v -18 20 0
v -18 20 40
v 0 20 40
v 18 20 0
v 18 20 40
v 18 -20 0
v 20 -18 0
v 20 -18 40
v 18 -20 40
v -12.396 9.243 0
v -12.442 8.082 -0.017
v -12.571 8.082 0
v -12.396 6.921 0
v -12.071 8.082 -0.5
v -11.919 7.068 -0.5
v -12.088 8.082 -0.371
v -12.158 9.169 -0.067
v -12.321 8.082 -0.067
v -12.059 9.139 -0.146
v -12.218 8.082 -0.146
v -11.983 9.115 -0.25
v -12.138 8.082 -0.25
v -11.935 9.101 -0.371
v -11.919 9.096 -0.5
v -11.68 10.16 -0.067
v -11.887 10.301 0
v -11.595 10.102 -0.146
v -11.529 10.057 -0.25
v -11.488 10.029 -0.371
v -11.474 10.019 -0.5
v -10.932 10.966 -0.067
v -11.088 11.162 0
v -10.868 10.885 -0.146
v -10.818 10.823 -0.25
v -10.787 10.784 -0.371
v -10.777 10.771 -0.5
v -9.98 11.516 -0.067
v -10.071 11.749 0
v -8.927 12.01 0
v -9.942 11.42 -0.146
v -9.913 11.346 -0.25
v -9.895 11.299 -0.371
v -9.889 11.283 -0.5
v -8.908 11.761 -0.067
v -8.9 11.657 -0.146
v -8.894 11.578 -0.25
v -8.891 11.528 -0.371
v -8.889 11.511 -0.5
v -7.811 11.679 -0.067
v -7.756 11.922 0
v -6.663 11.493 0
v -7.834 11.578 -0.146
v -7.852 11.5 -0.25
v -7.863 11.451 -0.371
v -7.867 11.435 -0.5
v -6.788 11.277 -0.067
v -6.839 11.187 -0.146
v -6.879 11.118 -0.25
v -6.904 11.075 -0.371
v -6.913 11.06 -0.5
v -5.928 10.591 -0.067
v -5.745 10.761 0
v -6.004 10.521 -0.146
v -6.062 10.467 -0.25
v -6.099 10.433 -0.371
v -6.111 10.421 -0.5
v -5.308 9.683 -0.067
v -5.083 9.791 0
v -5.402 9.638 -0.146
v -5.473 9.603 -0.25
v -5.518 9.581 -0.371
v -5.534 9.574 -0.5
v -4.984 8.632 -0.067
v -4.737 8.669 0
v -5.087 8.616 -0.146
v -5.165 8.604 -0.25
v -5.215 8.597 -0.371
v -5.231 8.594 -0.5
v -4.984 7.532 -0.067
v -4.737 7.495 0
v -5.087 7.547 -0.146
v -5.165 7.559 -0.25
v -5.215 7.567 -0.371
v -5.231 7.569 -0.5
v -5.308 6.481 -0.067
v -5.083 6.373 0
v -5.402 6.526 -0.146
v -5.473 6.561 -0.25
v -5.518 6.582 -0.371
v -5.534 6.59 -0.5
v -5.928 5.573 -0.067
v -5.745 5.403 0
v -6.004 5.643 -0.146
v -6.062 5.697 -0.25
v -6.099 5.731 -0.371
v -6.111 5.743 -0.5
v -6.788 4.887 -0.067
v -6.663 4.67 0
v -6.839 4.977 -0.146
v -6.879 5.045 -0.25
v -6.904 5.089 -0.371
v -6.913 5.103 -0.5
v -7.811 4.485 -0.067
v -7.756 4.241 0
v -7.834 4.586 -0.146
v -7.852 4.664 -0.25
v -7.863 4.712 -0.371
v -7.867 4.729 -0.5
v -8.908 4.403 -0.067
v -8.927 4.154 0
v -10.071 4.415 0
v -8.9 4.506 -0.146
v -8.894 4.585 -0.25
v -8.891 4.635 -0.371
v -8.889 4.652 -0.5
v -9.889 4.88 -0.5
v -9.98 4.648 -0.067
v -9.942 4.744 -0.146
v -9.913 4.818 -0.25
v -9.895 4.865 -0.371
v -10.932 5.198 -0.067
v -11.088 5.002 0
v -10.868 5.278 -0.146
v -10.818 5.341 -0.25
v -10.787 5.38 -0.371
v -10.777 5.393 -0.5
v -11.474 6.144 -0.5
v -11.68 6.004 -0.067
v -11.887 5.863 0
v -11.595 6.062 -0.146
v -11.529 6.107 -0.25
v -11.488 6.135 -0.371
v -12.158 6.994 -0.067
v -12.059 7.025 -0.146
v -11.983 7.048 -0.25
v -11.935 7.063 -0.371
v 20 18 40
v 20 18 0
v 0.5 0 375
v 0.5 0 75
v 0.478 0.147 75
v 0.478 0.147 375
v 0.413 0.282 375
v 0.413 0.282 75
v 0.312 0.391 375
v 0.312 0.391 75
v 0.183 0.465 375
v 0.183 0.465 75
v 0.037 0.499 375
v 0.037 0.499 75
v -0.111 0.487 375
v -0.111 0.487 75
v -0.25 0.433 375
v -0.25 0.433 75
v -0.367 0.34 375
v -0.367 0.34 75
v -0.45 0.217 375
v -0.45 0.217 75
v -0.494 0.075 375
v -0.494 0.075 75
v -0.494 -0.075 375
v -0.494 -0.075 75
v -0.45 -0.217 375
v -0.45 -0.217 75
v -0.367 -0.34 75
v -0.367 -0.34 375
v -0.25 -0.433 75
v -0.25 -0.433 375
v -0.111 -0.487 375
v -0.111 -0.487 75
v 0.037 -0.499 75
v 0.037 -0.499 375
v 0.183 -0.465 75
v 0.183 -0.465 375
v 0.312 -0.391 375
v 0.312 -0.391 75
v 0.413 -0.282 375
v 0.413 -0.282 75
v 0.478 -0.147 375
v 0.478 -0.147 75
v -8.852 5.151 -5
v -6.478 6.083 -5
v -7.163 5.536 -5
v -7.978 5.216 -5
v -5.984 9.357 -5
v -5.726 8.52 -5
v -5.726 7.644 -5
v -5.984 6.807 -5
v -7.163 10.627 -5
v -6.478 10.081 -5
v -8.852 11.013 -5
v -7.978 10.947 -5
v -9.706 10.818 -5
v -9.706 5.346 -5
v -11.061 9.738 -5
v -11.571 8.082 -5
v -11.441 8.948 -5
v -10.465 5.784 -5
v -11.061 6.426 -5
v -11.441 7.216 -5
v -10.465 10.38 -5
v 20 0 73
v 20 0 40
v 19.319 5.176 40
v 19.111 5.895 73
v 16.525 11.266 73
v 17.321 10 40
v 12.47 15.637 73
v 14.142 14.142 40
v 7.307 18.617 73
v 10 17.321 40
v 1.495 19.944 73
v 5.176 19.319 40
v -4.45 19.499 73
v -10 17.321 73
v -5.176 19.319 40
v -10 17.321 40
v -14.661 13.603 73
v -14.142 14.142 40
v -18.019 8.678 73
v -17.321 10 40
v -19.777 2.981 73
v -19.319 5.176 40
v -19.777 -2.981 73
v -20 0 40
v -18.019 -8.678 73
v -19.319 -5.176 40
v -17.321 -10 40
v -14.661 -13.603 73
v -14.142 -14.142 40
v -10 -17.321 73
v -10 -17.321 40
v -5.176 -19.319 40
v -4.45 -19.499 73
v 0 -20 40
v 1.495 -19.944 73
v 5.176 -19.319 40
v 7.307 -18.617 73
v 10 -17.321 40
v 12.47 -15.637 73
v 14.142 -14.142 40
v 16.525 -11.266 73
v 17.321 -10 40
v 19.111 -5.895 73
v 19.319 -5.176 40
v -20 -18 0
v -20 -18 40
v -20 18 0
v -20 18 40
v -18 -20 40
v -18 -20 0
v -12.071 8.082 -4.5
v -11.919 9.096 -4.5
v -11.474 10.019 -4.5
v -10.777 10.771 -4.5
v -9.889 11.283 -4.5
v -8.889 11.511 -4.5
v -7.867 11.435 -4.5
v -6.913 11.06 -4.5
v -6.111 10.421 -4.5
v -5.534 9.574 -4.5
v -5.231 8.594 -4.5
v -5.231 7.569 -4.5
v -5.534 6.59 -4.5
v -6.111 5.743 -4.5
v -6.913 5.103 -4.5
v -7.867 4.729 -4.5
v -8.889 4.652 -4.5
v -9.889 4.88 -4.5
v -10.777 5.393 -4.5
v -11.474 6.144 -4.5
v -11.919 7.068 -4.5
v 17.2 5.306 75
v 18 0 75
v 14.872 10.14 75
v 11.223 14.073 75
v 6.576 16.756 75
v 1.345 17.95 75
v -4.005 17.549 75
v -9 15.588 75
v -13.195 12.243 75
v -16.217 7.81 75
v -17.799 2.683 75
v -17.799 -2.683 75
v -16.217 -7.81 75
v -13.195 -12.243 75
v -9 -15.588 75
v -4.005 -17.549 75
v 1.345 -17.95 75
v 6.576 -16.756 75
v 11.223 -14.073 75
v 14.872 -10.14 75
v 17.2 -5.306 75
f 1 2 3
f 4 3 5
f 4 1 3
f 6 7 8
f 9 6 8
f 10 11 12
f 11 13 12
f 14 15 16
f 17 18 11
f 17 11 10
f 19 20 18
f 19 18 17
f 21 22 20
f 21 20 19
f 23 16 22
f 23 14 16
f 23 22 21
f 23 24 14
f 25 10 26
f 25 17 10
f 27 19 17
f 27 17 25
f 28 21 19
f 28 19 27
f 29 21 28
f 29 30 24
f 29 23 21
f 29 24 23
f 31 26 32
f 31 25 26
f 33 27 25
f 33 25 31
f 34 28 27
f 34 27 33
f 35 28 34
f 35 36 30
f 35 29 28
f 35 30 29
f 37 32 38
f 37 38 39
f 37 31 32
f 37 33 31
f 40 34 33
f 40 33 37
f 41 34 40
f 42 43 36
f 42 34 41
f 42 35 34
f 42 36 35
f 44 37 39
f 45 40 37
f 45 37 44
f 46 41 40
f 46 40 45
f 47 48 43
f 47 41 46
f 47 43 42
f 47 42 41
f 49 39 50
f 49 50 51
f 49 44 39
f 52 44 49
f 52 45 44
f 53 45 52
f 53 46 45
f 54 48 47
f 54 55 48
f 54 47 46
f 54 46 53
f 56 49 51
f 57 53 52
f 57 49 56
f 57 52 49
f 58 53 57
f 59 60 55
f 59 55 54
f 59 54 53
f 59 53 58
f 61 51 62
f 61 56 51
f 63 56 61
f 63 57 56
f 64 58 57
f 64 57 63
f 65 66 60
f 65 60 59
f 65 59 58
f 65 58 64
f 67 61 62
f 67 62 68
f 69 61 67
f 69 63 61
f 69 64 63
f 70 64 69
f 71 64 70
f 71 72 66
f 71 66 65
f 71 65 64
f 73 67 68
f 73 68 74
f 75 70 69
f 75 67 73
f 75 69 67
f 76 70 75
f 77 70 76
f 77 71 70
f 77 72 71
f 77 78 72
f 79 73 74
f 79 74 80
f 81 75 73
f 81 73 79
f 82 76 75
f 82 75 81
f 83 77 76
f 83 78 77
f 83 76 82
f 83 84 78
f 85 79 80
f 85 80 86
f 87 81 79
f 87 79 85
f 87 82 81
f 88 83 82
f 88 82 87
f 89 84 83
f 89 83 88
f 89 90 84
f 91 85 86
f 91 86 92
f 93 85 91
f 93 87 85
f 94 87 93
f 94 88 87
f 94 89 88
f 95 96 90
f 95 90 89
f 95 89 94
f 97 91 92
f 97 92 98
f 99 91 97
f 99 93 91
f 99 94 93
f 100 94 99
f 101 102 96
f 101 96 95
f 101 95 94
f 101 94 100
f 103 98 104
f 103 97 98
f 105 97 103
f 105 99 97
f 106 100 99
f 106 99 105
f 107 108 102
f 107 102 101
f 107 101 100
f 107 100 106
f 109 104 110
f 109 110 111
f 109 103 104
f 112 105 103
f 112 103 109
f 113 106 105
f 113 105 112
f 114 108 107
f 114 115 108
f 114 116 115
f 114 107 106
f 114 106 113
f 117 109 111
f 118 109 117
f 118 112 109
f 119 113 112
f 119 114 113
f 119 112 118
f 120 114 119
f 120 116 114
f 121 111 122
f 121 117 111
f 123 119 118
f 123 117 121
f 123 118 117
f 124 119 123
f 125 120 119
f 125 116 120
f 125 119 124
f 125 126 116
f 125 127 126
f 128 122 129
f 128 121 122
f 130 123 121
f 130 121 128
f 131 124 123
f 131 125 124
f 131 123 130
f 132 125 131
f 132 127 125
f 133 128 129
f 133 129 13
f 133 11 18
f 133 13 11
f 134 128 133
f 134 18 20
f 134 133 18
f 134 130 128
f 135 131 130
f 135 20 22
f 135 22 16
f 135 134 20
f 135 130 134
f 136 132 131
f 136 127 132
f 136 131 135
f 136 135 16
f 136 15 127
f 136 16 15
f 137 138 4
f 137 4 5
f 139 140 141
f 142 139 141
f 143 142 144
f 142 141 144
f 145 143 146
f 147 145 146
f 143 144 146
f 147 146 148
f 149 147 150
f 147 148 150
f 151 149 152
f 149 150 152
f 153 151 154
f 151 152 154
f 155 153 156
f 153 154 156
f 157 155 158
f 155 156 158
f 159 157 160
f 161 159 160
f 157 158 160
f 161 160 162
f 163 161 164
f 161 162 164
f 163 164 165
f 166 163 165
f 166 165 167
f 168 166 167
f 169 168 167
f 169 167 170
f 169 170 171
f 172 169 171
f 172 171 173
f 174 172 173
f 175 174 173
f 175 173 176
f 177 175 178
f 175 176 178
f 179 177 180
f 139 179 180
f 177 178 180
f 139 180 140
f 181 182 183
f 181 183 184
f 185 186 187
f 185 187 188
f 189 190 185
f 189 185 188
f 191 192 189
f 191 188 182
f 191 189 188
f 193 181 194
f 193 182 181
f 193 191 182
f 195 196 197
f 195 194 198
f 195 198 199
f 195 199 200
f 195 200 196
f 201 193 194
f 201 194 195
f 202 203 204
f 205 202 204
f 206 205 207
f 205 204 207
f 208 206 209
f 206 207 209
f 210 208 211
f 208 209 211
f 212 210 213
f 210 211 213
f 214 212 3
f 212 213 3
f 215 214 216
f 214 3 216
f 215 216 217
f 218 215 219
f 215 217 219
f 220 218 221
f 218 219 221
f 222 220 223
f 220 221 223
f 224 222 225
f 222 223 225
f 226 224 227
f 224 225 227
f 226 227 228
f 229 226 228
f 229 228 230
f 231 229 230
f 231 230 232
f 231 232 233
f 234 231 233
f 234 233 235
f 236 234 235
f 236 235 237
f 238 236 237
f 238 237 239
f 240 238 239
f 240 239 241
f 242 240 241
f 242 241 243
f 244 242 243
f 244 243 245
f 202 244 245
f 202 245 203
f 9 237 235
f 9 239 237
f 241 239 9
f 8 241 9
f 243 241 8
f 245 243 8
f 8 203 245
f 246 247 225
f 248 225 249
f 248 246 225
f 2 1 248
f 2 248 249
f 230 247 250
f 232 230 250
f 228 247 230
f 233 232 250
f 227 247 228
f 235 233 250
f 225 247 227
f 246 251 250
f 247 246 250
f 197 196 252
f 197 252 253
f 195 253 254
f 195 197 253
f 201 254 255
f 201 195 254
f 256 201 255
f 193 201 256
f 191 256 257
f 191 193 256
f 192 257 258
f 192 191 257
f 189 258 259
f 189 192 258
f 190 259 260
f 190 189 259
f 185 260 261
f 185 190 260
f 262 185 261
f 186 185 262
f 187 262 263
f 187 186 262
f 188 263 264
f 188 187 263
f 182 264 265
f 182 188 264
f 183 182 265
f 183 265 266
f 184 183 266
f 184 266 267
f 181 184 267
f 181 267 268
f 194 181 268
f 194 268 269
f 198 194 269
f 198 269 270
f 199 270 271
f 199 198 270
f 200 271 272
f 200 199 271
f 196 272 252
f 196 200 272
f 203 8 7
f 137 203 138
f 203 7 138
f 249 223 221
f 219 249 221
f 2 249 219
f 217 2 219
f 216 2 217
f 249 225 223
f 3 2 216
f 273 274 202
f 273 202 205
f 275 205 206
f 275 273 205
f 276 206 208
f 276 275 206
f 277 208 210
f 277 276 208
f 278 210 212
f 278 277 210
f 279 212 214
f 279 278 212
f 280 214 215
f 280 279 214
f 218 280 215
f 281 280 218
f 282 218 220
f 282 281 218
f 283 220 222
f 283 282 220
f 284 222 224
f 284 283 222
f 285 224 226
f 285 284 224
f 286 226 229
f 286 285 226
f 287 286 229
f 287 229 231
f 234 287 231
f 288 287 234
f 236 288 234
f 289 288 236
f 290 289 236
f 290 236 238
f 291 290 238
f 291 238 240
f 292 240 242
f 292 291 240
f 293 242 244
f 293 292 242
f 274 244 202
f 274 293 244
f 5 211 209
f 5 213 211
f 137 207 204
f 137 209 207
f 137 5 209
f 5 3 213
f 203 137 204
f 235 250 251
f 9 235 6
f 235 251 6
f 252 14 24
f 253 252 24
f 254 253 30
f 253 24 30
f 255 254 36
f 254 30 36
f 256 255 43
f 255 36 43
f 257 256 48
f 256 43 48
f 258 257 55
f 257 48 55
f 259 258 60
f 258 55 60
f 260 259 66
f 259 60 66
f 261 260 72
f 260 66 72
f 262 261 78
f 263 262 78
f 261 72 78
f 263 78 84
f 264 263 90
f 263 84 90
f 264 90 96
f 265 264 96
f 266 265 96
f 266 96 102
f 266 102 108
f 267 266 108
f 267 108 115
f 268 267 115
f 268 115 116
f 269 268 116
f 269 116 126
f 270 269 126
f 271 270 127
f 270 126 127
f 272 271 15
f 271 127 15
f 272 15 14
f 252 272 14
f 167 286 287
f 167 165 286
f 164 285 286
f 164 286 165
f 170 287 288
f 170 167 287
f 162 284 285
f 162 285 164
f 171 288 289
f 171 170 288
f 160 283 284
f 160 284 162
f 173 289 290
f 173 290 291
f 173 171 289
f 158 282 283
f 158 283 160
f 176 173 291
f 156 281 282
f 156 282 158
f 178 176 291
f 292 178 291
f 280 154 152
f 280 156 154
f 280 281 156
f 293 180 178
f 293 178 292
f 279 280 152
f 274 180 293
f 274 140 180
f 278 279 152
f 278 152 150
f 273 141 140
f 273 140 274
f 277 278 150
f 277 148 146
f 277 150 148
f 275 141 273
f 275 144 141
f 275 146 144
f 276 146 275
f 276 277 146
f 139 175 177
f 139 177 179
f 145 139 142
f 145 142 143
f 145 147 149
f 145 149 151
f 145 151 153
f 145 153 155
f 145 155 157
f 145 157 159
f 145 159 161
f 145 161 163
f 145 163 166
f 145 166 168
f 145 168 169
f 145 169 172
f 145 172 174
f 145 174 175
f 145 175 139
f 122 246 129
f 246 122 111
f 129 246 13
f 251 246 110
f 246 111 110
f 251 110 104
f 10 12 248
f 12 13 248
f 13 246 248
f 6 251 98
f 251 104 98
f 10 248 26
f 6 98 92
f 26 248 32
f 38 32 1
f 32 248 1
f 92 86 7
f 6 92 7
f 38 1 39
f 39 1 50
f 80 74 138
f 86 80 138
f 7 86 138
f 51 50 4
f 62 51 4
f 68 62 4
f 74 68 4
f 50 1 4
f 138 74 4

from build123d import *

# Parameters (mm, degrees)
SKETCH_1_W      = 40
SKETCH_1_H      = 40
EXTRUDE_1_DEPTH = 40
SKETCH_2_R      = 20
EXTRUDE_2_DEPTH = 35
SKETCH_8_R      = 3.439176188
EXTRUDE_3_DEPTH = 5
FILLET_3_R      = 0.5
CHAMFER_1_SIZE  = 0.5
CHAMFER_2_SIZE  = 2
CHAMFER_3_SIZE  = 2
SKETCH_9_R      = 0.5
EXTRUDE_4_DEPTH = 300


with BuildPart() as part:
    # 草图1 → 凸台-拉伸1 (new body)
    with BuildSketch(Plane.XY):
        Rectangle(SKETCH_1_W, SKETCH_1_H)
    extrude(amount=EXTRUDE_1_DEPTH)

    # 草图2 → 凸台-拉伸2 (add)
    with BuildSketch(Plane.XY.offset(40)):
        Circle(SKETCH_2_R)
    extrude(amount=EXTRUDE_2_DEPTH)

    # 草图8 → 凸台-拉伸3 (add)
    with BuildSketch(Plane(origin=(0, 0, 0), x_dir=(-1, 0, 0), z_dir=(0, 0, -1))):
        with Locations((8.63222484, 8.081848089)):
            Circle(SKETCH_8_R)
    extrude(amount=EXTRUDE_3_DEPTH)

    # 圆角3
    fillet_3_edges = [part.edges().sort_by_distance(p)[0] for p in [
        (-5.193048652, 8.081848089, 0),
    ]]
    fillet(fillet_3_edges, radius=FILLET_3_R)

    # 倒角1
    chamfer_1_edges = [part.edges().sort_by_distance(p)[0] for p in [
        (-5.193048652, 8.081848089, -5),
    ]]
    chamfer(chamfer_1_edges, length=CHAMFER_1_SIZE)

    # 倒角2
    chamfer_2_edges = [part.edges().sort_by_distance(p)[0] for p in [
        (-20, 20, 20),
        (20, 20, 20),
        (20, -20, 20),
        (-20, -20, 20),
    ]]
    chamfer(chamfer_2_edges, length=CHAMFER_2_SIZE)

    # 倒角3
    chamfer_3_edges = [part.edges().sort_by_distance(p)[0] for p in [
        (-20, 0, 75),
    ]]
    chamfer(chamfer_3_edges, length=CHAMFER_3_SIZE)

    # 草图9 → 凸台-拉伸4 (add)
    with BuildSketch(Plane.XY.offset(75)):
        Circle(SKETCH_9_R)
    extrude(amount=EXTRUDE_4_DEPTH)


solid = part.part
